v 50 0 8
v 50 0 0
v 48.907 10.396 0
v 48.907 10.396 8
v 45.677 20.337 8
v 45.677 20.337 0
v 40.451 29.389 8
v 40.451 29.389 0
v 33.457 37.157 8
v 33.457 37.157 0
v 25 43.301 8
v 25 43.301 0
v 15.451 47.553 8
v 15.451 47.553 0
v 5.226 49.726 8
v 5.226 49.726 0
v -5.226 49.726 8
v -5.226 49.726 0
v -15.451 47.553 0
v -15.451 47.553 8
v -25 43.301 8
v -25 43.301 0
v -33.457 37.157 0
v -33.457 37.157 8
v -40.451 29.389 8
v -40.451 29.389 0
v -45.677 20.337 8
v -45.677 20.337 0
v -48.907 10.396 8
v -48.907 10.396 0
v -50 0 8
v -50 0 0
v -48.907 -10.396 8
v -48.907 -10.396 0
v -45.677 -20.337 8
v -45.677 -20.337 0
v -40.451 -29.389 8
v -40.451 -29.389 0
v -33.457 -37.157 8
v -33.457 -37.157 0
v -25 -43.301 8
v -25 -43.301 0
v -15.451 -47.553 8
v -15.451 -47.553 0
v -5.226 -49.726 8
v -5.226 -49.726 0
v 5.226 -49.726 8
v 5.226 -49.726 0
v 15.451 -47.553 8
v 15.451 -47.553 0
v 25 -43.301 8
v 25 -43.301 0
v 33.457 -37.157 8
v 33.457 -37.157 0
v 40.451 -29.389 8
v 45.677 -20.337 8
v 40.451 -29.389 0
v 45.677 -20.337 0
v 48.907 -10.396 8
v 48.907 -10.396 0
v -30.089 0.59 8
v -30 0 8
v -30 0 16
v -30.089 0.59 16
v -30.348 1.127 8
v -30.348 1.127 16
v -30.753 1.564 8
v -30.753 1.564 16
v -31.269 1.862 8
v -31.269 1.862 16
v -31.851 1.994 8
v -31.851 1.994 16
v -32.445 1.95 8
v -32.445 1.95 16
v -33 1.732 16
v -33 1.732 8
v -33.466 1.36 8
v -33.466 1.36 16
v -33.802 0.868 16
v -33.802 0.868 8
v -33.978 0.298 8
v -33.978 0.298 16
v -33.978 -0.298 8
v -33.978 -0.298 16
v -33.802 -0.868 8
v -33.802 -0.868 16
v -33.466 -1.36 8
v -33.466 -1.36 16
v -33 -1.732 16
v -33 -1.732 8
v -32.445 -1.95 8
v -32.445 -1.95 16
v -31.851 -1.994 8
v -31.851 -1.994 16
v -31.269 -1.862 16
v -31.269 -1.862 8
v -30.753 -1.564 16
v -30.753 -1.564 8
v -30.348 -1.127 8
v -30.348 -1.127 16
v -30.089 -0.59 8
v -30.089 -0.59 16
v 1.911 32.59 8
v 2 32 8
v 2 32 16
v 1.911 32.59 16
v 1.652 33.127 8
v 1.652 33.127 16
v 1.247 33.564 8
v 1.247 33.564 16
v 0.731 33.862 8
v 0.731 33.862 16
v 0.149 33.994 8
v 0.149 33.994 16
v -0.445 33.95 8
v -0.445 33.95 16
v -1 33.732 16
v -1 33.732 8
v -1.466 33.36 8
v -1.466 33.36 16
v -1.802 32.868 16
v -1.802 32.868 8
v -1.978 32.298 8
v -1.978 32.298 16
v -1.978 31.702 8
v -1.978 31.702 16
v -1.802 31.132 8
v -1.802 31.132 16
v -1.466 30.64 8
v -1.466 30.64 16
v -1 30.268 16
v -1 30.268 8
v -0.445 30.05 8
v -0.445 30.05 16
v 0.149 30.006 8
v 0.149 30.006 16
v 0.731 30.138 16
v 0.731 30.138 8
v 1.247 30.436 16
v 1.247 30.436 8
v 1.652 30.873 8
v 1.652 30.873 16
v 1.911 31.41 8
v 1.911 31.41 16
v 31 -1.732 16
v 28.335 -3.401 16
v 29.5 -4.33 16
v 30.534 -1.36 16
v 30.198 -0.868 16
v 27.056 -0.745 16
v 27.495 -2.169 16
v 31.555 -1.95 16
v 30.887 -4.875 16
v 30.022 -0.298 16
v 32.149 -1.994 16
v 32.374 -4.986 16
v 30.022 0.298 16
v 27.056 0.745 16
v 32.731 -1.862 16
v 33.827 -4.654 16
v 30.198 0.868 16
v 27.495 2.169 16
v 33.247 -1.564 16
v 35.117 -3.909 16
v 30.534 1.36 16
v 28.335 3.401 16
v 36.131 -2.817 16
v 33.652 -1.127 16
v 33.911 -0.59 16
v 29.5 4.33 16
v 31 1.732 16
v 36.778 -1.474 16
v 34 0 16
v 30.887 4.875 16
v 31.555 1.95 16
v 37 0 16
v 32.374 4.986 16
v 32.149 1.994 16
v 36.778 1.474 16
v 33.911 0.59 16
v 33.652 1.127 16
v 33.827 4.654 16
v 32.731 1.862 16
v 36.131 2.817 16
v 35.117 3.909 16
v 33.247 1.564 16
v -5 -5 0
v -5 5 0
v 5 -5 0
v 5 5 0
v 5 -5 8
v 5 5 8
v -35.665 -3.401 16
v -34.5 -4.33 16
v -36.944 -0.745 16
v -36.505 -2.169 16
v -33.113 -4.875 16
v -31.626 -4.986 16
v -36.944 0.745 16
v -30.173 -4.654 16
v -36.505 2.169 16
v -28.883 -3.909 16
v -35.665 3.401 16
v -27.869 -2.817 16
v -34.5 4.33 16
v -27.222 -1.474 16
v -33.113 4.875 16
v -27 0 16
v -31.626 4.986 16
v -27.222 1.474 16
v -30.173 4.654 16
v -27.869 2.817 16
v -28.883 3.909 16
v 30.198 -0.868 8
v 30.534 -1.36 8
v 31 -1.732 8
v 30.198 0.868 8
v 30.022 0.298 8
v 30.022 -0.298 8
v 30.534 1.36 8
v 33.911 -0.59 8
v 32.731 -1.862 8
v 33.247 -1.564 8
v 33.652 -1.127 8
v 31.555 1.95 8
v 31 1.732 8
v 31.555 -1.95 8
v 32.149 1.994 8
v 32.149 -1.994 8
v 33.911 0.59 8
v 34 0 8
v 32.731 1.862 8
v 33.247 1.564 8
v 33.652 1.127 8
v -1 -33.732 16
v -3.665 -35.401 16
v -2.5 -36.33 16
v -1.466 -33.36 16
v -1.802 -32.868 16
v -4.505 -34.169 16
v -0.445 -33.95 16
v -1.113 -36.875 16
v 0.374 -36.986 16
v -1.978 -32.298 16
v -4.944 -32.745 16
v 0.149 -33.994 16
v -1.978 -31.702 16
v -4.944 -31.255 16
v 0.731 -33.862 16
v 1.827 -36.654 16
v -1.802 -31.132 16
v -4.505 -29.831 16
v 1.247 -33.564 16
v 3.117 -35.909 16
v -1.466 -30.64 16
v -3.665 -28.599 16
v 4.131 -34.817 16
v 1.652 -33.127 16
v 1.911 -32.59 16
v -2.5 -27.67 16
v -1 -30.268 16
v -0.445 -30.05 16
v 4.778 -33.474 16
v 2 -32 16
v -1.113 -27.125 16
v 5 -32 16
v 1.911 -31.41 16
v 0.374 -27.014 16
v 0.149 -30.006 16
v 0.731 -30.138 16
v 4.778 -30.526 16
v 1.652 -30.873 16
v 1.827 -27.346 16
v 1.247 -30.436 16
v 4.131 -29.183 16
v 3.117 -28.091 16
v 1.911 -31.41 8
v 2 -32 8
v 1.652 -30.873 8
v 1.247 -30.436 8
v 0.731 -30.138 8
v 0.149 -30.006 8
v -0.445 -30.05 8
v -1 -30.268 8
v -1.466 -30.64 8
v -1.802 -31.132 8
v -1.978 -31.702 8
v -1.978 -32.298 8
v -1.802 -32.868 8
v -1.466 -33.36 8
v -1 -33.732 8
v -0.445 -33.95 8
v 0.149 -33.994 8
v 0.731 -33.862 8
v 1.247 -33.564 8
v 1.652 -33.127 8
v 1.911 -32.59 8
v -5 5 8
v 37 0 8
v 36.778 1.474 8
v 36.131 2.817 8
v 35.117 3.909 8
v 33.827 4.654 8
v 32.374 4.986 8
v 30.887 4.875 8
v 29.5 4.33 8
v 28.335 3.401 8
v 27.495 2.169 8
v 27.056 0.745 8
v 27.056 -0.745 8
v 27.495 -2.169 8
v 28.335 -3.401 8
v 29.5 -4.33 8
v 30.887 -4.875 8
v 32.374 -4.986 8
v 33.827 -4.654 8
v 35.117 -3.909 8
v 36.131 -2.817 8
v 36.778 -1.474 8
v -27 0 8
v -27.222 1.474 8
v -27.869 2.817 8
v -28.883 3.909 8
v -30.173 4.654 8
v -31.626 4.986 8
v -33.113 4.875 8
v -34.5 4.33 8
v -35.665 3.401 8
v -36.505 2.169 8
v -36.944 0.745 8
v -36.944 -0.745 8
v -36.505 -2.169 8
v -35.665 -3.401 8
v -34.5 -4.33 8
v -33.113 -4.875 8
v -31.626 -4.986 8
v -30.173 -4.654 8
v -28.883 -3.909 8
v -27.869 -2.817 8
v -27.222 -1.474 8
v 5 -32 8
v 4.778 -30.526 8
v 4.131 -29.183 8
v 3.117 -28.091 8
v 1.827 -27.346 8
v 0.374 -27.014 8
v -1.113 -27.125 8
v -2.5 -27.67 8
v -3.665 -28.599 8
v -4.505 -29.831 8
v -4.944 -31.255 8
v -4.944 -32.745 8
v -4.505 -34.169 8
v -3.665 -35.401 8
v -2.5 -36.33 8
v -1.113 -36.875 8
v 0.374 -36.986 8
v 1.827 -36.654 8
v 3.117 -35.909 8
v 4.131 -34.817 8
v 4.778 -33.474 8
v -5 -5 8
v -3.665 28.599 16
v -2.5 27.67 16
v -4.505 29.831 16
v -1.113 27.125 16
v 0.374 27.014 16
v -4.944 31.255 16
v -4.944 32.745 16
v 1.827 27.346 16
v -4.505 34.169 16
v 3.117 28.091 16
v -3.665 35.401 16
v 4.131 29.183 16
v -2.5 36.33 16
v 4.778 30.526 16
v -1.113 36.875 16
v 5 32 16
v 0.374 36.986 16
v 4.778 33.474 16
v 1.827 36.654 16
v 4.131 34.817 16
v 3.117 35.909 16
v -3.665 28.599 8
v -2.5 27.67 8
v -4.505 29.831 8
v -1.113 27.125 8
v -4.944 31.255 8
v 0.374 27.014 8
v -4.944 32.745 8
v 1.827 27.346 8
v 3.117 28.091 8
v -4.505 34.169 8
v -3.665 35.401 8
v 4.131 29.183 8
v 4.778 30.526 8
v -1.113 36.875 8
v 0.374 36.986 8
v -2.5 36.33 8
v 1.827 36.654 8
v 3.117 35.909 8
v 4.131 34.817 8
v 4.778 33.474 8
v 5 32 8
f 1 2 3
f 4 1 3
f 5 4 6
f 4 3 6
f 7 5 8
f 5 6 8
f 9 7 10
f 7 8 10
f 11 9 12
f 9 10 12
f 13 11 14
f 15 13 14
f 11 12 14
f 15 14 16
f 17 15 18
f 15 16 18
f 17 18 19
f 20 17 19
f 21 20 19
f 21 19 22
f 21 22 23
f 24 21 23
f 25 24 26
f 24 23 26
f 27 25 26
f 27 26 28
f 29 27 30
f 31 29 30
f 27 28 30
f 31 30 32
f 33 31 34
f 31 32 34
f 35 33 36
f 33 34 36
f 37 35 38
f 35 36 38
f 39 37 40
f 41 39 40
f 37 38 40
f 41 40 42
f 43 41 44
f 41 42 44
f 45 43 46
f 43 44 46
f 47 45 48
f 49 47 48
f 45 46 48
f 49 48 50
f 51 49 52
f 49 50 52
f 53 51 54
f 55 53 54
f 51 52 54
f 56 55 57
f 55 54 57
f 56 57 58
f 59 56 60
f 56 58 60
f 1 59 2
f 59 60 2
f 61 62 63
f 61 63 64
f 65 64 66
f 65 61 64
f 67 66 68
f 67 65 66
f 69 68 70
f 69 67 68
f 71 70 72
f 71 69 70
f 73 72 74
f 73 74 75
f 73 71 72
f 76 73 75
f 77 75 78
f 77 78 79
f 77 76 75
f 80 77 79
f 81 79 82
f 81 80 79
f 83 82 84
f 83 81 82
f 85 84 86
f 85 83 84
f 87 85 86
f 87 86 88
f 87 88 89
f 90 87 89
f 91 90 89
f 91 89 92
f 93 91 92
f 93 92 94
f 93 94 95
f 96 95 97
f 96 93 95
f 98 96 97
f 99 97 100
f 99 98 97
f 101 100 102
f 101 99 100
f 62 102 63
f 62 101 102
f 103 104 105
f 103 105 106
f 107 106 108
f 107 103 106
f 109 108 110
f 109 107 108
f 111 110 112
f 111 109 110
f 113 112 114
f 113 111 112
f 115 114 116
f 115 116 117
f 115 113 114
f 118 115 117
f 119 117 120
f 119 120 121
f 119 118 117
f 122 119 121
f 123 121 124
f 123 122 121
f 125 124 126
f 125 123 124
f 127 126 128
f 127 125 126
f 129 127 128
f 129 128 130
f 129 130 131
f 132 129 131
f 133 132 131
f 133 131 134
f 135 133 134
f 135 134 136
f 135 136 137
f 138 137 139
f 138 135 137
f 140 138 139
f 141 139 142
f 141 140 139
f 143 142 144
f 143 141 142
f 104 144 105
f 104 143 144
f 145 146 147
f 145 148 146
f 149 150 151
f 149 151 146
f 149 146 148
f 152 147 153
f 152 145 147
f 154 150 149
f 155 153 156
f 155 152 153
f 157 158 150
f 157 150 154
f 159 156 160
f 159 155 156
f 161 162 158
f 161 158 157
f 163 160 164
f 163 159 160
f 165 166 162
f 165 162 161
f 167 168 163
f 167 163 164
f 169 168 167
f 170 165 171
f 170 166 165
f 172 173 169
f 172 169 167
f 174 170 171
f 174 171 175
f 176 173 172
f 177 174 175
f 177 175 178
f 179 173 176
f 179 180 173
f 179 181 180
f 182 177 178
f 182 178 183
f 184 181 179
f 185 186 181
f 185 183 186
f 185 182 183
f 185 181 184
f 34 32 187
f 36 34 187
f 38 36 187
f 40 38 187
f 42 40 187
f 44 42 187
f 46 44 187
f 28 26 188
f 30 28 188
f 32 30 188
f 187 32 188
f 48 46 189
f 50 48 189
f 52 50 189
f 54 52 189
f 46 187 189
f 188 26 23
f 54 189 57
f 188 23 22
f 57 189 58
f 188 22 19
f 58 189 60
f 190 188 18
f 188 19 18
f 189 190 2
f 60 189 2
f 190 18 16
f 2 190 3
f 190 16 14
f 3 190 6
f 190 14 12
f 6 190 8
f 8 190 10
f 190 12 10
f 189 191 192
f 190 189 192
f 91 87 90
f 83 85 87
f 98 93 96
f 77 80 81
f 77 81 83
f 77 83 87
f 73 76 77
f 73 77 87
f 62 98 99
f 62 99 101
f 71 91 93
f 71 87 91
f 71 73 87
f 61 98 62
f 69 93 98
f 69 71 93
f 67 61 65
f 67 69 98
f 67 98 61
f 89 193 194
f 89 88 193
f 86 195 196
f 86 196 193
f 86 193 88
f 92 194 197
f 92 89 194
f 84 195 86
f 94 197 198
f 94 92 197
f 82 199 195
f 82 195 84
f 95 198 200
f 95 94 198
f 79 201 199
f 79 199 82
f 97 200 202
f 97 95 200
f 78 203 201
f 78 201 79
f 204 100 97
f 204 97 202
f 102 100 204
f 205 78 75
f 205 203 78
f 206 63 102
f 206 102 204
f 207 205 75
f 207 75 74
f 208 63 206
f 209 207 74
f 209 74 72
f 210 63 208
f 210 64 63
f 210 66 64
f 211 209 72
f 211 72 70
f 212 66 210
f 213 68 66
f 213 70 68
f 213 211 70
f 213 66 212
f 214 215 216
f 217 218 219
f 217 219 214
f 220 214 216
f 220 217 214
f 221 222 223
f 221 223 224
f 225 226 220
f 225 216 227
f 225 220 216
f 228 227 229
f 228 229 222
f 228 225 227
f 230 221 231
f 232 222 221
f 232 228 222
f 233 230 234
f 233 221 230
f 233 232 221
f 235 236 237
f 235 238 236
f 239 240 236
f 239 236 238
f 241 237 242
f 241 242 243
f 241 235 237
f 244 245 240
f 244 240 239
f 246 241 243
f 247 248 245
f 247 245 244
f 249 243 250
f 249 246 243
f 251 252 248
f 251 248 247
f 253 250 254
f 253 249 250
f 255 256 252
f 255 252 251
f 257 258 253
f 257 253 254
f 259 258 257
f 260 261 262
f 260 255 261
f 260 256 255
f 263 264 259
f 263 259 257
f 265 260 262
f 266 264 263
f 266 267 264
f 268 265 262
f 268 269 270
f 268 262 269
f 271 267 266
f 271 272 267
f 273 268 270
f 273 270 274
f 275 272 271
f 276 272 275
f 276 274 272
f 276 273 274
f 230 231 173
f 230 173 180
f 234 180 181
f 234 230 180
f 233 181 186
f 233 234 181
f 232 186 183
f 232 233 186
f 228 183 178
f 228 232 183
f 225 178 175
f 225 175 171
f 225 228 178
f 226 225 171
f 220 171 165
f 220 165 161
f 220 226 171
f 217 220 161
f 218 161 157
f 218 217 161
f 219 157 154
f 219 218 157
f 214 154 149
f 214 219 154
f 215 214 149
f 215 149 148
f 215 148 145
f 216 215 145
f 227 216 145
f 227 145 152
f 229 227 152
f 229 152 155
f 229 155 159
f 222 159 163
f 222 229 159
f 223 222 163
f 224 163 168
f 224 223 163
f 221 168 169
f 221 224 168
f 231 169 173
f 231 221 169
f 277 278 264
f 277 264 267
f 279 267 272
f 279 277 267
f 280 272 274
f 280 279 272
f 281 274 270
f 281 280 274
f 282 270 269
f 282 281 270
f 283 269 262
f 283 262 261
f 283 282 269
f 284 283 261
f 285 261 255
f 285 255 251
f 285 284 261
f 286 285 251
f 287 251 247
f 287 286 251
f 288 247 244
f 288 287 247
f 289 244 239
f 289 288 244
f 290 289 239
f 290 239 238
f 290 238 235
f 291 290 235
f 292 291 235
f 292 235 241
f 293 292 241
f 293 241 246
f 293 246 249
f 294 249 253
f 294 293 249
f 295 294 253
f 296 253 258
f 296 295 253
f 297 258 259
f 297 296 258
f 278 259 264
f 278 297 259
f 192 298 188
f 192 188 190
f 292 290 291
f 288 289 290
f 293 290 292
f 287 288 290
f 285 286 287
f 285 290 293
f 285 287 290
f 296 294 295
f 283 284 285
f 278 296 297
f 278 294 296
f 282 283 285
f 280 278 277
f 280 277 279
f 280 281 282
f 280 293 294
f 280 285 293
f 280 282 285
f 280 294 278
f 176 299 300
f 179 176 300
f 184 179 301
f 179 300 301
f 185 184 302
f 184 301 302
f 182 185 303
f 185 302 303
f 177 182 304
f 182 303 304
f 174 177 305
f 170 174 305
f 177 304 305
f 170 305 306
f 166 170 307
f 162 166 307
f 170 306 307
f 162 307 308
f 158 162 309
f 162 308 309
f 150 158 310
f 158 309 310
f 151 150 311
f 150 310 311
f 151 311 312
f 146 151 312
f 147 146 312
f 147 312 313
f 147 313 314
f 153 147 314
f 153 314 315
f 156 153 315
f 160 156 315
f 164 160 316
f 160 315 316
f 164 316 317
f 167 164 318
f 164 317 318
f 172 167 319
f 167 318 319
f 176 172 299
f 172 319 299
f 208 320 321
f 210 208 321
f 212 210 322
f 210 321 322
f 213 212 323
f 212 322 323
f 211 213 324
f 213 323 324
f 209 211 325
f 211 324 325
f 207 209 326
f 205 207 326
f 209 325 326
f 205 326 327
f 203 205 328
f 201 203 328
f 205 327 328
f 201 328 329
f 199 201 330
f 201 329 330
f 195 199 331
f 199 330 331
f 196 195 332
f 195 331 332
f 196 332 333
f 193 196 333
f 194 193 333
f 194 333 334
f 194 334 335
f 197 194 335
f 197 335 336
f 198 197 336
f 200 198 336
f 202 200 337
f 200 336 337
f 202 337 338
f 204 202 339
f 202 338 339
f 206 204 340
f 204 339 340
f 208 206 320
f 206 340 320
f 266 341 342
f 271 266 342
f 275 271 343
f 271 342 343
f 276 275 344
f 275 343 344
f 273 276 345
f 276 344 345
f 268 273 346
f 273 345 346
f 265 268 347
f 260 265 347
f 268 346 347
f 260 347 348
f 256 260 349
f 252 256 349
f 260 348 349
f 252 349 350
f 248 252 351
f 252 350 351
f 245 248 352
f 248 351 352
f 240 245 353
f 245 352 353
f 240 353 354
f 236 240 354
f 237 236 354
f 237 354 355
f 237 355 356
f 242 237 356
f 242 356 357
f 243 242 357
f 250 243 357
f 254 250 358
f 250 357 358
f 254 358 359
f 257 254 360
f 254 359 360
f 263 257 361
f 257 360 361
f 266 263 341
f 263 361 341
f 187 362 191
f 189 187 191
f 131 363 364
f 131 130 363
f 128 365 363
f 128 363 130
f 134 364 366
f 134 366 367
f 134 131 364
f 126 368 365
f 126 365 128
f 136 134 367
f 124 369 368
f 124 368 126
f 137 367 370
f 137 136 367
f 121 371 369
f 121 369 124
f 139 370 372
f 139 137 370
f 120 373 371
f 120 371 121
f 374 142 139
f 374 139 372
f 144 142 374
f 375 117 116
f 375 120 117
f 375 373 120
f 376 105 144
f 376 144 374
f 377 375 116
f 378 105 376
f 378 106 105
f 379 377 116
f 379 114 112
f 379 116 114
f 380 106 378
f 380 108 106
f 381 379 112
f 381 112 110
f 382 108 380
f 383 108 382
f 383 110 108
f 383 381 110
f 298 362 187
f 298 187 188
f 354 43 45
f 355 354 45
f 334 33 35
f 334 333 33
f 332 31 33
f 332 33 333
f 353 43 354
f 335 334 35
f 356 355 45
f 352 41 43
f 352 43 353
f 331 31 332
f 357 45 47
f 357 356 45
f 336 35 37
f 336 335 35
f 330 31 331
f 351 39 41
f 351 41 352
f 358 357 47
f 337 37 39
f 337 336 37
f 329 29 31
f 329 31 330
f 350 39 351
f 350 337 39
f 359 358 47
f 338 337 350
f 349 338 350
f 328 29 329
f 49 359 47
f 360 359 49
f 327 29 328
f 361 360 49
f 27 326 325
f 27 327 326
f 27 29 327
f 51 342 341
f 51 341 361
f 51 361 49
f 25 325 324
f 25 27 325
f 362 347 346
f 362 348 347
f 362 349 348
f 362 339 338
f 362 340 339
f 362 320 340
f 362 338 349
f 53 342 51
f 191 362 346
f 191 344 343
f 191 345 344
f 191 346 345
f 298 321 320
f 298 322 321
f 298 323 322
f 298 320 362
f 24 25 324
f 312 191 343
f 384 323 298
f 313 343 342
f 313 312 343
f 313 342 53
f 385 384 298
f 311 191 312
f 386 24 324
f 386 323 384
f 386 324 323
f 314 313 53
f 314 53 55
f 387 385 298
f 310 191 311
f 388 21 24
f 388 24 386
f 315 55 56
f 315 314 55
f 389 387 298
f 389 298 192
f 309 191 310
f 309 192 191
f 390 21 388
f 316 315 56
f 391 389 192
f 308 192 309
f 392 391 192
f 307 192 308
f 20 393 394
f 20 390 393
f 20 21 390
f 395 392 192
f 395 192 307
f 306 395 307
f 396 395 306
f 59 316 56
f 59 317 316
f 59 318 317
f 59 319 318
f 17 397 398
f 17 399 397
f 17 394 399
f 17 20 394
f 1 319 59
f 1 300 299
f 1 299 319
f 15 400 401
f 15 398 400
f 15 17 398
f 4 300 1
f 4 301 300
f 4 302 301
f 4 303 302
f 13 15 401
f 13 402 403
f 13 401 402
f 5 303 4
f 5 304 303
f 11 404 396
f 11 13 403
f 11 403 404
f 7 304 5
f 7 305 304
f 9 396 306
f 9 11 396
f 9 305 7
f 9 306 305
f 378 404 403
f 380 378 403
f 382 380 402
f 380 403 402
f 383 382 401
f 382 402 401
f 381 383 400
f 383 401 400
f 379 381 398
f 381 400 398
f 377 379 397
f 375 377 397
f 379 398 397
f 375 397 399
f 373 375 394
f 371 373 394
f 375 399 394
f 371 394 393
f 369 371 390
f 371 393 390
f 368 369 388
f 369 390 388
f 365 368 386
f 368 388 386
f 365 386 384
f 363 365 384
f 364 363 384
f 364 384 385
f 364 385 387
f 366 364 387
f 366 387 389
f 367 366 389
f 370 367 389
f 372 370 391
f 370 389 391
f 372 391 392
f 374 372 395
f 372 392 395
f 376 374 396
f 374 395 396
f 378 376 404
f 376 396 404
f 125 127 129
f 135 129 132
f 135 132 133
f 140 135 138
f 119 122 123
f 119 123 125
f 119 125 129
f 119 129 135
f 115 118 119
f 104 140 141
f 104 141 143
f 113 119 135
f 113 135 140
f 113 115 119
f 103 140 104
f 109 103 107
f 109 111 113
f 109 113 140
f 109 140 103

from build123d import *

# Parameters (mm, degrees)
SKETCH_1_R          = 50
EXTRUDE_1_DEPTH     = 8
SKETCH_2_W          = 10
SKETCH_2_H          = 10
CUT_EXTRUDE_1_DEPTH = 8
SKETCH_3_R          = 5
SKETCH_3_R_2        = 2
EXTRUDE_3_DEPTH     = 8


with BuildPart() as part:
    # 草图1 → 凸台-拉伸1 (new body)
    with BuildSketch(Plane.XY):
        Circle(SKETCH_1_R)
    extrude(amount=EXTRUDE_1_DEPTH)

    # 草图2 → 切除-拉伸1 (cut)
    with BuildSketch(Plane.XY.offset(8)):
        Rectangle(SKETCH_2_W, SKETCH_2_H)
    extrude(amount=-CUT_EXTRUDE_1_DEPTH, mode=Mode.SUBTRACT)

    # 草图3 → 凸台-拉伸3 (add)
    # profile 1 of 4: a face of its own
    with BuildSketch(Plane.XY.offset(8)):
        with Locations((0, 32)):
            Circle(SKETCH_3_R)
        with Locations((0, 32)):
            Circle(SKETCH_3_R_2, mode=Mode.SUBTRACT)
    # profile 2 of 4: a face of its own
    with BuildSketch(Plane.XY.offset(8)):
        with Locations((32, 0)):
            Circle(SKETCH_3_R)
        with Locations((32, 0)):
            Circle(SKETCH_3_R_2, mode=Mode.SUBTRACT)
    # profile 3 of 4: a face of its own
    with BuildSketch(Plane.XY.offset(8)):
        with Locations((0, -32)):
            Circle(SKETCH_3_R)
        with Locations((0, -32)):
            Circle(SKETCH_3_R_2, mode=Mode.SUBTRACT)
    # profile 4 of 4: a face of its own
    with BuildSketch(Plane.XY.offset(8)):
        with Locations((-32, 0)):
            Circle(SKETCH_3_R)
        with Locations((-32, 0)):
            Circle(SKETCH_3_R_2, mode=Mode.SUBTRACT)
    extrude(amount=EXTRUDE_3_DEPTH)


solid = part.part
